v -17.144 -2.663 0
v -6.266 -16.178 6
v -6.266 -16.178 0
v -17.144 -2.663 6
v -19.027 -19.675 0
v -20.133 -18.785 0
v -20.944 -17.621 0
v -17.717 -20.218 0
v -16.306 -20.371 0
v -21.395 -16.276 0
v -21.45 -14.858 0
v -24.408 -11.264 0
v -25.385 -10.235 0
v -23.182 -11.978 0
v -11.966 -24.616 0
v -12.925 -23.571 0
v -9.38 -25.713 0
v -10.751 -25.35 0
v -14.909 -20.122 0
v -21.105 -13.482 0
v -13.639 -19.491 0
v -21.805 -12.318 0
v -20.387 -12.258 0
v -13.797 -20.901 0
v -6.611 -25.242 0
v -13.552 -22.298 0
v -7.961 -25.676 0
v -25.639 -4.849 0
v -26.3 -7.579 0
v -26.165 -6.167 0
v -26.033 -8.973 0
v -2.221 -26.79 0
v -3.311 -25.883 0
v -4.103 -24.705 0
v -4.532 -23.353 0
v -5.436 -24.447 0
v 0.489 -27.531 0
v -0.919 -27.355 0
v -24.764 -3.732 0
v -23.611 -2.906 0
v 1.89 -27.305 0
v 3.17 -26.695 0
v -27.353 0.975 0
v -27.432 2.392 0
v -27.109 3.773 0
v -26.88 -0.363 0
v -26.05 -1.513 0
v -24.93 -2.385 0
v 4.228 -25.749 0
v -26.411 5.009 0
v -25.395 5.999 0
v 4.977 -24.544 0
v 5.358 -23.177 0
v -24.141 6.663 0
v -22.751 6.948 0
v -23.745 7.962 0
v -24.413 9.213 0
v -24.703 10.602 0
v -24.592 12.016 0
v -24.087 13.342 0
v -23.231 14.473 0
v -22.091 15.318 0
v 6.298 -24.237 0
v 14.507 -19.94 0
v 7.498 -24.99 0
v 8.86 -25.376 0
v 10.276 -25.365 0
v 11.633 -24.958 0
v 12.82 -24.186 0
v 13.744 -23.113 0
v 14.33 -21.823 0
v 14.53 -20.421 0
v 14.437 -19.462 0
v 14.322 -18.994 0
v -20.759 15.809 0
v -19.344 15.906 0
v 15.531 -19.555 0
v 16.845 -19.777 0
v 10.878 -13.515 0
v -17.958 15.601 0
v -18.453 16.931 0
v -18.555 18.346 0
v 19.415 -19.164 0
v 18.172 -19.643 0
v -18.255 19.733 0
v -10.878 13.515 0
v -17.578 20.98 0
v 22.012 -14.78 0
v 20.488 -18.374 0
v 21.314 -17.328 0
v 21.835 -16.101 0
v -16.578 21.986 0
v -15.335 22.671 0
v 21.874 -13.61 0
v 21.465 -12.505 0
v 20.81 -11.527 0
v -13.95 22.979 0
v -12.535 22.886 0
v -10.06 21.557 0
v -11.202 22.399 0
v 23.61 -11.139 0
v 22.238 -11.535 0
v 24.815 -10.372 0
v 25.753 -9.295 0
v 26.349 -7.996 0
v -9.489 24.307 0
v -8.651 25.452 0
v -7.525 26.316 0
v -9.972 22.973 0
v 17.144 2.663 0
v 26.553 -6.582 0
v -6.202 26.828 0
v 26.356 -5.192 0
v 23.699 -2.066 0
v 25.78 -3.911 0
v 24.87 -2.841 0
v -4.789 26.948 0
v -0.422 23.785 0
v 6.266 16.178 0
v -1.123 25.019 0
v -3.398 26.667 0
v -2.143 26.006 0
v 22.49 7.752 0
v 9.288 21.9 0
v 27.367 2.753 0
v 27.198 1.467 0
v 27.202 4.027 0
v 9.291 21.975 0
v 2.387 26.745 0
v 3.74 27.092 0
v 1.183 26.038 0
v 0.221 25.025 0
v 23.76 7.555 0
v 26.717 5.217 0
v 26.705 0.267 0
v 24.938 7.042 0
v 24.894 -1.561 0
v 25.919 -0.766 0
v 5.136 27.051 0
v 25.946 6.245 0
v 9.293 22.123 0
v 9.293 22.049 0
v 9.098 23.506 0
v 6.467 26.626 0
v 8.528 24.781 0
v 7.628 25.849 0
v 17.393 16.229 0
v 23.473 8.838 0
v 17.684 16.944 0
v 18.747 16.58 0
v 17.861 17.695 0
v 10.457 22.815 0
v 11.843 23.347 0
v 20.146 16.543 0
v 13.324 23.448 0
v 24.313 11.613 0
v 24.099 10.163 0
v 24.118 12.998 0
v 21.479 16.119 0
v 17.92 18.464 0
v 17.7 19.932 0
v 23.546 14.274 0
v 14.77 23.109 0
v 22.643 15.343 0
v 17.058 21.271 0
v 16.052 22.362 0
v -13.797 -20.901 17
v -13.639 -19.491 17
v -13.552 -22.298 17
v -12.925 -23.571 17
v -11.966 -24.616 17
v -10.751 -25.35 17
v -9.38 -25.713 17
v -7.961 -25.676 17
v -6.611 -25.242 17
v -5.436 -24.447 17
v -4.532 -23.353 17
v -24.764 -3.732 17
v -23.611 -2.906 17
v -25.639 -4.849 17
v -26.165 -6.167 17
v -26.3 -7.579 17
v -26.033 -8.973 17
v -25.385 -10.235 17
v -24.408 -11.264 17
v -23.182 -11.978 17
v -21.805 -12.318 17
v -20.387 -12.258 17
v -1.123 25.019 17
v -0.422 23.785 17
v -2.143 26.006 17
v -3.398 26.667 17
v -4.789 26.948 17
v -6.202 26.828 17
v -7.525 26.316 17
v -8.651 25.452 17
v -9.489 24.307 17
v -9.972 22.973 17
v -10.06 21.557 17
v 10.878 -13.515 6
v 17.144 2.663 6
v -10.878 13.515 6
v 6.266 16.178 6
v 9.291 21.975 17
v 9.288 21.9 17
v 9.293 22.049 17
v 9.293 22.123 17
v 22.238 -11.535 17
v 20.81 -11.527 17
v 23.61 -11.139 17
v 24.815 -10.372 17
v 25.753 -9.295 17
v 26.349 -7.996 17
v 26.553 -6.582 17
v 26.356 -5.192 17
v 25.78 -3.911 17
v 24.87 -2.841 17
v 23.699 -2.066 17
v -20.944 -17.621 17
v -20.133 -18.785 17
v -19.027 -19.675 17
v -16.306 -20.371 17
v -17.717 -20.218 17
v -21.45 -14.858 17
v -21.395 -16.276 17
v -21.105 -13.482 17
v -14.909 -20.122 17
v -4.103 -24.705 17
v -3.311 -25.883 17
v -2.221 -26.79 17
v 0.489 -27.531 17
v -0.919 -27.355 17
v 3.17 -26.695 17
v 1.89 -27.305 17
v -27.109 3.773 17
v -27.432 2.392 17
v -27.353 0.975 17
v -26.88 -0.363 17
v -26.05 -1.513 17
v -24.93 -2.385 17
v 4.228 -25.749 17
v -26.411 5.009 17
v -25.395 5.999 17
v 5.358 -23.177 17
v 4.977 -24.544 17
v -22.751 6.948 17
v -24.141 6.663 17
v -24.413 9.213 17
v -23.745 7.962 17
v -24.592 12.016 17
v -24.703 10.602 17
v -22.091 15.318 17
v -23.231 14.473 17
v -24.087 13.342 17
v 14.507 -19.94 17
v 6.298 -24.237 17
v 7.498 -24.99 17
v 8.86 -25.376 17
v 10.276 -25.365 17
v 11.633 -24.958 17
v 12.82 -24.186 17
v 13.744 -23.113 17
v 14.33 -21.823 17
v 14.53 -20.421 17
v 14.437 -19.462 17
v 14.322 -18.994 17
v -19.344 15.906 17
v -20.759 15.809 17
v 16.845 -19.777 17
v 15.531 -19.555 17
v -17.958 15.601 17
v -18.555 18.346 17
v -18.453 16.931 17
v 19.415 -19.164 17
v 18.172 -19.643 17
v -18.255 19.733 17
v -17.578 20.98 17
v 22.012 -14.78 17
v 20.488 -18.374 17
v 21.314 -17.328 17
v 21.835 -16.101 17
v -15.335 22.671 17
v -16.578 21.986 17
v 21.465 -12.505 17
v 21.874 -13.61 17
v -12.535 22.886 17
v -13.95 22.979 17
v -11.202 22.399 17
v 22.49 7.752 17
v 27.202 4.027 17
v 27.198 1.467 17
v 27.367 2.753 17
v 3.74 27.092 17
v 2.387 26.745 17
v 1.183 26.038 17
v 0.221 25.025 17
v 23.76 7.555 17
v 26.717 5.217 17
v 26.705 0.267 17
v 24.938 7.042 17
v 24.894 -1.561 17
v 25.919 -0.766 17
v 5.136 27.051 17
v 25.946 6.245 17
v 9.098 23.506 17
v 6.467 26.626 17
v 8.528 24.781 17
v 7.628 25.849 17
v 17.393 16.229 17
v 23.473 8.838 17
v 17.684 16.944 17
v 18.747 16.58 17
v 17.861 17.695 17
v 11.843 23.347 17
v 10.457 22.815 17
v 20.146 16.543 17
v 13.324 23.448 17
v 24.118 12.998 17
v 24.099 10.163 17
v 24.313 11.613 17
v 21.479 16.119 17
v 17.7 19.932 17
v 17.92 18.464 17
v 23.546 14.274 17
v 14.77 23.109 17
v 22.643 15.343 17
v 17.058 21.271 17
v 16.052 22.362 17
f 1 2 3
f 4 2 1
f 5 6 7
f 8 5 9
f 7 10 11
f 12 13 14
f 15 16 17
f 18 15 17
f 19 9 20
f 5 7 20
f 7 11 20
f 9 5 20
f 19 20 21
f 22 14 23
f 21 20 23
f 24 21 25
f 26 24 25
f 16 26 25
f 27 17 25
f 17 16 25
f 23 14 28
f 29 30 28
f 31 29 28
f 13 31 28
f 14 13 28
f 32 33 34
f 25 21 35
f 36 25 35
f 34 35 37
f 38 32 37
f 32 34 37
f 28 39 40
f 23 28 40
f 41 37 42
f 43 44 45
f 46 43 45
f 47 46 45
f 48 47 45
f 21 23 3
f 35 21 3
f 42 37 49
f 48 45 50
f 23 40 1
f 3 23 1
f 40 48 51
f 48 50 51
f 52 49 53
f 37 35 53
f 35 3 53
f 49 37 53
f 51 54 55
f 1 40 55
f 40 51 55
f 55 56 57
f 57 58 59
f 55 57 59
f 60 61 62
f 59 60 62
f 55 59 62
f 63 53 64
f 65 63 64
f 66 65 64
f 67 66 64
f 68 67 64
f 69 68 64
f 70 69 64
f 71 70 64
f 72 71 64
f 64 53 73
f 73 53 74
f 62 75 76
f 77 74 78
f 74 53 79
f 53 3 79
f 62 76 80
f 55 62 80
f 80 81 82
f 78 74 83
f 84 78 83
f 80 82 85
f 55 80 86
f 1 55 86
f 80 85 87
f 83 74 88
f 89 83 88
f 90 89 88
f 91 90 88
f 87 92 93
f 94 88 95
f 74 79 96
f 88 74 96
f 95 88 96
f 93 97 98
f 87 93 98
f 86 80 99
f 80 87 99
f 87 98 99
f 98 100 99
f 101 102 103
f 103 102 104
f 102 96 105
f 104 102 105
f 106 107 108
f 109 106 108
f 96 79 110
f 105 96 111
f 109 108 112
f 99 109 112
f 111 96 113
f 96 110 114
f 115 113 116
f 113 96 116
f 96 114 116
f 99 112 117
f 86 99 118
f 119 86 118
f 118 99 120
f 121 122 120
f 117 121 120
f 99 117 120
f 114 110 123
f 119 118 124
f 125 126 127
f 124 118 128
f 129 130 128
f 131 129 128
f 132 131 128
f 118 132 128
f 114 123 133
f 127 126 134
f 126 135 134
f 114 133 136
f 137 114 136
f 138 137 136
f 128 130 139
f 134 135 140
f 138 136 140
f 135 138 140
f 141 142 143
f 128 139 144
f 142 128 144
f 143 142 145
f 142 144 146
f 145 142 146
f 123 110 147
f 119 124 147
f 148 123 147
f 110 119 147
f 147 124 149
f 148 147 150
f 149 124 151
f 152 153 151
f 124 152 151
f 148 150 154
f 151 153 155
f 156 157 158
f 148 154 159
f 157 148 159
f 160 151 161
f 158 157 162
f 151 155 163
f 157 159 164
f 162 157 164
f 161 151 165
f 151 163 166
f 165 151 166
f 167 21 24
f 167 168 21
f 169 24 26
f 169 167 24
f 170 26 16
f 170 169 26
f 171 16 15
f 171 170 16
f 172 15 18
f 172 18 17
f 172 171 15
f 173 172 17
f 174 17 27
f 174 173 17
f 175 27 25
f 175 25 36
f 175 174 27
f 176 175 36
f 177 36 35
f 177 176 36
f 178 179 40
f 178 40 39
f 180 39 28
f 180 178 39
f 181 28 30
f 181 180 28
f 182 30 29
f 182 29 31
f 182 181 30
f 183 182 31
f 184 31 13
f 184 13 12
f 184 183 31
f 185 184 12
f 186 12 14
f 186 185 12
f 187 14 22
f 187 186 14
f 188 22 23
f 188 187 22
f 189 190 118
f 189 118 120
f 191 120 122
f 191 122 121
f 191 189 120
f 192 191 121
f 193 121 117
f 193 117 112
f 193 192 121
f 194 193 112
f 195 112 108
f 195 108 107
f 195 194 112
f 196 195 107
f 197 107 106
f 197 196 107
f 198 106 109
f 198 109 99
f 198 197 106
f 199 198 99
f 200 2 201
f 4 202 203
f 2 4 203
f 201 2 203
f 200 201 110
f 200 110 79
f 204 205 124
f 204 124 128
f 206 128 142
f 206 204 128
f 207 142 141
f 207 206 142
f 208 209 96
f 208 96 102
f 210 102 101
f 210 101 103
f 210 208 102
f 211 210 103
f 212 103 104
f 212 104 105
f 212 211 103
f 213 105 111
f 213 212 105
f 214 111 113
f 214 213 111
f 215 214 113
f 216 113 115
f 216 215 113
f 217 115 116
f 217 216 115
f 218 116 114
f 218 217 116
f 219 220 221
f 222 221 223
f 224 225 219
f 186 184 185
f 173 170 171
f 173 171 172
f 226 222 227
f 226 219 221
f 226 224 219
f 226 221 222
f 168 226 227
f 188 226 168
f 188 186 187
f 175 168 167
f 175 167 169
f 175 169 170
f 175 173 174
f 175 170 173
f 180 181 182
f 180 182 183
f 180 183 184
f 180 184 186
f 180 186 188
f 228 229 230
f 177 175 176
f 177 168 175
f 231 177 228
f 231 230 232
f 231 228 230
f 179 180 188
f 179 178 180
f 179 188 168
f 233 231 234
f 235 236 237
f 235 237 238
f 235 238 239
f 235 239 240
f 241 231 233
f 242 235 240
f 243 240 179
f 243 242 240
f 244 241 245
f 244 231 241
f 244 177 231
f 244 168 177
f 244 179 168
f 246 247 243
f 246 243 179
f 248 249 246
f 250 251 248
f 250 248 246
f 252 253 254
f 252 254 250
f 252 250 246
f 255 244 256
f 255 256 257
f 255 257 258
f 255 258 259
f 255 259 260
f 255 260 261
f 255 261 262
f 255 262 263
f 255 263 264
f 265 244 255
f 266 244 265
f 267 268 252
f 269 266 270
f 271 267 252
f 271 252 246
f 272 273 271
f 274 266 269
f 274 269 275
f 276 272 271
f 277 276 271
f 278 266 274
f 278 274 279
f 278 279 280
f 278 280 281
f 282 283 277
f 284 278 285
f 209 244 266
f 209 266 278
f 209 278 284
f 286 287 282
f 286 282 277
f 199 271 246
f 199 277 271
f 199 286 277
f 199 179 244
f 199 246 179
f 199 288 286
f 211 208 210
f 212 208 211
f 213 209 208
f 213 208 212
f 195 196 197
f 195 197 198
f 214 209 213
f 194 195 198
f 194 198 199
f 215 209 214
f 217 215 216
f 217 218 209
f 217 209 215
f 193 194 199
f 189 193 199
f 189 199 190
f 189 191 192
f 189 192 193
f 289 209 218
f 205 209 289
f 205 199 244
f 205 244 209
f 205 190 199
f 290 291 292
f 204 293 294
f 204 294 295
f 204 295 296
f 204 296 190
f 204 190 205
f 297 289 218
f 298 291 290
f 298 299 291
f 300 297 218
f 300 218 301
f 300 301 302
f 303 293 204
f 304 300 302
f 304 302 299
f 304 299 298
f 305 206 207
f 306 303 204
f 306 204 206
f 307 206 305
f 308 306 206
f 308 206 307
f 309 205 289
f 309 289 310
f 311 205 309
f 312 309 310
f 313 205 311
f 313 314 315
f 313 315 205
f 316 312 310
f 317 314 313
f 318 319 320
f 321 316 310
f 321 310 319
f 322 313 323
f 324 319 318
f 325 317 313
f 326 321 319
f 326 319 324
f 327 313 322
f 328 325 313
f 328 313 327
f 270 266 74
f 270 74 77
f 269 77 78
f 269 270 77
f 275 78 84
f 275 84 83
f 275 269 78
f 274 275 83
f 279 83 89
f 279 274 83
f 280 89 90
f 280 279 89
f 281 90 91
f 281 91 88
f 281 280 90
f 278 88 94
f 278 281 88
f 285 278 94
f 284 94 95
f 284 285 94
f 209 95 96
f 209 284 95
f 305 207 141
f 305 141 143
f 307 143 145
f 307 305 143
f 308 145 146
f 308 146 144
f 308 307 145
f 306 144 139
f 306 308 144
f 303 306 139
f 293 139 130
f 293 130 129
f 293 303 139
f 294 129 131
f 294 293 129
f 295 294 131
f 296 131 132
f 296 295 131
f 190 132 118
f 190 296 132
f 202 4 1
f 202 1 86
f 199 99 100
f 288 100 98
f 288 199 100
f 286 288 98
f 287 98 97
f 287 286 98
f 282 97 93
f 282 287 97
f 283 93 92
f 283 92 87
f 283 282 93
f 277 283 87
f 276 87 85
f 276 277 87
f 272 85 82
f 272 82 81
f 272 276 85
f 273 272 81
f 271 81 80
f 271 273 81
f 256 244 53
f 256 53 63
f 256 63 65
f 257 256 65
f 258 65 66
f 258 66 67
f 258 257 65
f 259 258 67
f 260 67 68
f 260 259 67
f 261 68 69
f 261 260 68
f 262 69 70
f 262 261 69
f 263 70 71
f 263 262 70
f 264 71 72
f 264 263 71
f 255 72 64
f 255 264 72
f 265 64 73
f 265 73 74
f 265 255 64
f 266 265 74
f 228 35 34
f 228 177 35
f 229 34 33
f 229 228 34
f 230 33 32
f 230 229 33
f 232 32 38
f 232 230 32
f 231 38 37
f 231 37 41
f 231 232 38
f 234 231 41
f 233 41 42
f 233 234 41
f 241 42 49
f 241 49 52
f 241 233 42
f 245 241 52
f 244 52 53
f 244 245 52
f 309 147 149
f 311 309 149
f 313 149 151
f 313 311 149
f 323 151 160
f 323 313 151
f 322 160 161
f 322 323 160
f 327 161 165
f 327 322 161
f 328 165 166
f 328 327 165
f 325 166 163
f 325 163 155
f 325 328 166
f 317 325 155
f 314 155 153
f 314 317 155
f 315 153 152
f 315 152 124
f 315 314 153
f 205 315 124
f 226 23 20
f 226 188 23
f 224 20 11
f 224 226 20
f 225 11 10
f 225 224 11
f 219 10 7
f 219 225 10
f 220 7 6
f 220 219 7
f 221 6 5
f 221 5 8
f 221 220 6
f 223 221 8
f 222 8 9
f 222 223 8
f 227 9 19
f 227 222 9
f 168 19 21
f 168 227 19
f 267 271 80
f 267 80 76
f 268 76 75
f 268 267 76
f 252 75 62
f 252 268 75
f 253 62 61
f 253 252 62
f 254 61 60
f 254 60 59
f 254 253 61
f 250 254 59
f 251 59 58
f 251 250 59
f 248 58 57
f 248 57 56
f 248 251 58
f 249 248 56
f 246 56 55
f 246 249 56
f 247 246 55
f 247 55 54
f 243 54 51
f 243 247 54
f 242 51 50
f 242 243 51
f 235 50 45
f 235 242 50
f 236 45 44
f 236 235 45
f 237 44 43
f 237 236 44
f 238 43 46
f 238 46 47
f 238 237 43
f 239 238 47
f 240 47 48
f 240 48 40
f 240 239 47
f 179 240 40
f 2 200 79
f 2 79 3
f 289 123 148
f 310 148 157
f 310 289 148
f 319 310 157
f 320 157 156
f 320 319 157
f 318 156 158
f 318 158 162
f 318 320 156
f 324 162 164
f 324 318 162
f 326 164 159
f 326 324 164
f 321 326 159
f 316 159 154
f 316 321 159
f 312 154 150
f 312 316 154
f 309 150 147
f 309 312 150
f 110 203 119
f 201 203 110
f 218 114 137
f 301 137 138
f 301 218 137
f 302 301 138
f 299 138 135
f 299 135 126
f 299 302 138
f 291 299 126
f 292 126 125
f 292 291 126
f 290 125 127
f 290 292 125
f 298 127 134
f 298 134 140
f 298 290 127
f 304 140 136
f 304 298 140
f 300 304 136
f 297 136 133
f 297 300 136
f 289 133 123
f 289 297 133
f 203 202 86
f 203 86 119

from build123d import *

# Parameters (mm, degrees)
F1_DEPTH = 12
F2_DEPTH = 6
F4_DEPTH = 6
F5_R     = 22.5356386782
F6_DEPTH = 5
F8_DEPTH = 5
F9_DEPTH = 12


with BuildPart() as f1:
    # F0 (on Top) → F1 (new body)
    with BuildSketch(Plane.XY):
        Polygon((-6.8684225896, -21.4634522332), (15.1536835921, -16.6799545631), (22.0221061816, 4.7834976701), (6.8684225896, 21.4634522332), (-15.1536835921, 16.6799545631), (-22.0221061816, -4.7834976701), align=None)
        Polygon((17.1437614944, 2.6631325835), (10.8782212182, -13.5153666788), (-6.2655402762, -16.1784992623), (-17.1437614944, -2.6631325835), (-10.8782212182, 13.5153666788), (6.2655402762, 16.1784992623), align=None, mode=Mode.SUBTRACT)
    extrude(amount=F1_DEPTH)

    # F2 (add): a face of the model
    f2_faces = [f1.faces().sort_by_distance(p)[0] for p in [
        (4.0120820931, -18.4706890138, 12),
    ]]
    extrude(f2_faces, amount=-F2_DEPTH)

    # F3 (on face) → F4 (join)
    with BuildSketch(Plane.XY.offset(12)):
        Polygon((-6.8684225896, -21.4634522332), (15.1536835921, -16.6799545631), (22.0221061816, 4.7834976701), (6.8684225896, 21.4634522332), (-15.1536835921, 16.6799545631), (-22.0221061816, -4.7834976701), align=None)
    extrude(amount=-F4_DEPTH)

    # F5 (on face) → F6 (join)
    with BuildSketch(Plane.XY.offset(12)):
        Circle(F5_R)
    extrude(amount=F6_DEPTH)

    # F7 (on face) → F8 (join, through all)
    with BuildSketch(Plane.XY.offset(17)):
        with BuildLine():
            ThreePointArc((-15.3228461638, 13.3118642514), (-10.7195158187, 13.8841980042), (-8.5676941997, 17.9936845793))
            ThreePointArc((-8.5676941997, 17.9936845793), (-8.571695634, 18.193680409), (-8.5836935324, 18.3933561306))
            ThreePointArc((-8.5836935324, 18.3933561306), (-9.6069182239, 19.842074122), (-10.0600152117, 21.5568556553))
            ThreePointArc((-10.0600152117, 21.5568556553), (-16.5779692563, 21.9859576265), (-17.958244305, 15.6013907485))
            ThreePointArc((-17.958244305, 15.6013907485), (-16.4342353434, 14.6941039842), (-15.3228461638, 13.3118642514))
        make_face()
        with BuildLine():
            ThreePointArc((-10.0600152117, 21.5568556553), (-9.6069182239, 19.842074122), (-8.5836935324, 18.3933561306))
            ThreePointArc((-8.5836935324, 18.3933561306), (-9.0367905202, 20.108137664), (-10.0600152117, 21.5568556553))
        make_face()
        with BuildLine():
            ThreePointArc((-10.0600152117, 21.5568556553), (-9.0367905202, 20.108137664), (-8.5836935324, 18.3933561306))
            ThreePointArc((-8.5836935324, 18.3933561306), (-3.9497951777, 17.0850151275), (-0.3603423089, 20.2944696365))
            ThreePointArc((-0.3603423089, 20.2944696365), (-0.7058578854, 22.034122353), (-0.4223180959, 23.7849443815))
            ThreePointArc((-0.4223180959, 23.7849443815), (-6.2022339112, 26.8280392859), (-10.0600152117, 21.5568556553))
        make_face()
        with BuildLine():
            ThreePointArc((-14.7133962691, 10.9195704206), (-14.86815373, 12.1539223707), (-15.3228461638, 13.3118642514))
            ThreePointArc((-15.3228461638, 13.3118642514), (-16.8468551254, 14.2191510156), (-17.958244305, 15.6013907485))
            ThreePointArc((-17.958244305, 15.6013907485), (-24.0872231108, 13.3423041573), (-22.7513298124, 6.9483036471))
            ThreePointArc((-22.7513298124, 6.9483036471), (-20.9900515753, 6.7393262339), (-19.4125394898, 5.9286301086))
            ThreePointArc((-19.4125394898, 5.9286301086), (-16.0730471171, 7.4920555699), (-14.7133962691, 10.9195704206))
        make_face()
        with BuildLine():
            ThreePointArc((-17.958244305, 15.6013907485), (-16.8468551254, 14.2191510156), (-15.3228461638, 13.3118642514))
            ThreePointArc((-15.3228461638, 13.3118642514), (-16.4342353434, 14.6941039842), (-17.958244305, 15.6013907485))
        make_face()
        with BuildLine():
            ThreePointArc((-0.0760145444, 21.9565272067), (-0.1476090631, 21.1134261386), (-0.3603423089, 20.2944696365))
            ThreePointArc((-0.3603423089, 20.2944696365), (3.3407842567, 17.2144643949), (7.9253153735, 18.6864849728))
            ThreePointArc((7.9253153735, 18.6864849728), (8.3172516941, 20.4162706555), (9.2884016553, 21.9004001446))
            ThreePointArc((9.2884016553, 21.9004001446), (9.2921158652, 22.0116159212), (9.2933541397, 22.1228868113))
            ThreePointArc((9.2933541397, 22.1228868113), (5.1364552078, 27.0512922927), (-0.4223180959, 23.7849443815))
            ThreePointArc((-0.4223180959, 23.7849443815), (-0.163353237, 22.8869888549), (-0.0760145444, 21.9565272067))
        make_face()
        with BuildLine():
            ThreePointArc((-0.4223180959, 23.7849443815), (-0.7058578854, 22.034122353), (-0.3603423089, 20.2944696365))
            ThreePointArc((-0.3603423089, 20.2944696365), (-0.1476090631, 21.1134261386), (-0.0760145444, 21.9565272067))
            ThreePointArc((-0.0760145444, 21.9565272067), (-0.163353237, 22.8869888549), (-0.4223180959, 23.7849443815))
        make_face()
        with BuildLine():
            ThreePointArc((9.2884016553, 21.9004001446), (8.8964653347, 20.1706144619), (7.9253153735, 18.6864849728))
            ThreePointArc((7.9253153735, 18.6864849728), (10.053711743, 14.3673763799), (14.8406140286, 13.8474372958))
            ThreePointArc((14.8406140286, 13.8474372958), (15.9022328957, 15.2682602857), (17.3930723778, 16.2290777639))
            ThreePointArc((17.3930723778, 16.2290777639), (17.7867551587, 17.3158579496), (17.9203628891, 18.4639983061))
            ThreePointArc((17.9203628891, 18.4639983061), (14.7697132927, 23.1094157346), (9.2884016553, 21.9004001446))
        make_face()
        with BuildLine():
            ThreePointArc((9.2884016553, 21.9004001446), (8.3172516941, 20.4162706555), (7.9253153735, 18.6864849728))
            ThreePointArc((7.9253153735, 18.6864849728), (8.8964653347, 20.1706144619), (9.2884016553, 21.9004001446))
        make_face()
        with BuildLine():
            ThreePointArc((-19.4125394898, 5.9286301086), (-20.9900515753, 6.7393262339), (-22.7513298124, 6.9483036471))
            ThreePointArc((-22.7513298124, 6.9483036471), (-21.1738177269, 6.1376075218), (-19.4125394898, 5.9286301086))
        make_face()
        with BuildLine():
            ThreePointArc((-19.4125394898, 5.9286301086), (-21.1738177269, 6.1376075218), (-22.7513298124, 6.9483036471))
            ThreePointArc((-22.7513298124, 6.9483036471), (-27.4315772639, 2.3916450882), (-23.6105037059, -2.9062082783))
            ThreePointArc((-23.6105037059, -2.9062082783), (-21.9164972013, -2.3807422472), (-20.1456283806, -2.4797180399))
            ThreePointArc((-20.1456283806, -2.4797180399), (-18.1770538363, -0.6383809453), (-17.4504730331, 1.957363335))
            ThreePointArc((-17.4504730331, 1.957363335), (-17.9677468694, 4.1721243022), (-19.4125394898, 5.9286301086))
        make_face()
        with BuildLine():
            ThreePointArc((17.3930723778, 16.2290777639), (16.3314535106, 14.8082547741), (14.8406140286, 13.8474372958))
            ThreePointArc((14.8406140286, 13.8474372958), (15.0282611338, 9.0360384653), (19.1898356953, 6.6140419105))
            ThreePointArc((19.1898356953, 6.6140419105), (20.7375735625, 7.4802290047), (22.4903228751, 7.7516004012))
            ThreePointArc((22.4903228751, 7.7516004012), (23.8346616371, 9.4776861736), (24.3133235172, 11.6125167536))
            ThreePointArc((24.3133235172, 11.6125167536), (22.0880977695, 15.7719190963), (17.3930723778, 16.2290777639))
        make_face()
        with BuildLine():
            ThreePointArc((17.3930723778, 16.2290777639), (15.9022328957, 15.2682602857), (14.8406140286, 13.8474372958))
            ThreePointArc((14.8406140286, 13.8474372958), (16.3314535106, 14.8082547741), (17.3930723778, 16.2290777639))
        make_face()
        with BuildLine():
            ThreePointArc((-20.1456283806, -2.4797180399), (-21.9164972013, -2.3807422472), (-23.6105037059, -2.9062082783))
            ThreePointArc((-23.6105037059, -2.9062082783), (-21.8396348852, -3.005184071), (-20.1456283806, -2.4797180399))
        make_face()
        with BuildLine():
            ThreePointArc((-20.1456283806, -2.4797180399), (-21.8396348852, -3.005184071), (-23.6105037059, -2.9062082783))
            ThreePointArc((-23.6105037059, -2.9062082783), (-26.0327625001, -8.972551144), (-20.387207014, -12.2582103903))
            ThreePointArc((-20.387207014, -12.2582103903), (-19.053381356, -11.0891587654), (-17.3953551071, -10.4593004118))
            ThreePointArc((-17.3953551071, -10.4593004118), (-16.585938737, -8.9938168824), (-16.3056590535, -7.3432896533))
            ThreePointArc((-16.3056590535, -7.3432896533), (-17.3813659092, -4.2449153509), (-20.1456283806, -2.4797180399))
        make_face()
        with BuildLine():
            ThreePointArc((22.4903228751, 7.7516004012), (20.9425850079, 6.885413307), (19.1898356953, 6.6140419105))
            ThreePointArc((19.1898356953, 6.6140419105), (17.4042876471, 2.1422874102), (20.2209604362, -1.7629814079))
            ThreePointArc((20.2209604362, -1.7629814079), (21.9871993653, -1.601201827), (23.6987922291, -2.0661990919))
            ThreePointArc((23.6987922291, -2.0661990919), (26.3455148518, -0.275092905), (27.3668350532, 2.753125558))
            ThreePointArc((27.3668350532, 2.753125558), (25.9457622045, 6.2447269736), (22.4903228751, 7.7516004012))
        make_face()
        with BuildLine():
            ThreePointArc((22.4903228751, 7.7516004012), (20.7375735625, 7.4802290047), (19.1898356953, 6.6140419105))
            ThreePointArc((19.1898356953, 6.6140419105), (20.9425850079, 6.885413307), (22.4903228751, 7.7516004012))
        make_face()
        with BuildLine():
            ThreePointArc((-17.3953551071, -10.4593004118), (-19.053381356, -11.0891587654), (-20.387207014, -12.2582103903))
            ThreePointArc((-20.387207014, -12.2582103903), (-18.7291807651, -11.6283520367), (-17.3953551071, -10.4593004118))
        make_face()
        with BuildLine():
            ThreePointArc((-17.3953551071, -10.4593004118), (-18.7291807651, -11.6283520367), (-20.387207014, -12.2582103903))
            ThreePointArc((-20.387207014, -12.2582103903), (-20.1326465997, -18.7853117703), (-13.6387770174, -19.4906565634))
            ThreePointArc((-13.6387770174, -19.4906565634), (-12.8957627797, -17.8801589912), (-11.6372669038, -16.6303747227))
            ThreePointArc((-11.6372669038, -16.6303747227), (-11.517156057, -16.0073953668), (-11.4769030677, -15.3742211488))
            ThreePointArc((-11.4769030677, -15.3742211488), (-13.282553384, -11.5276473358), (-17.3953551071, -10.4593004118))
        make_face()
        with BuildLine():
            ThreePointArc((23.6987922291, -2.0661990919), (21.9325532999, -2.2279786728), (20.2209604362, -1.7629814079))
            ThreePointArc((20.2209604362, -1.7629814079), (16.7709547133, -5.1218846001), (17.755697416, -9.8351692247))
            ThreePointArc((17.755697416, -9.8351692247), (19.4350386505, -10.4057703163), (20.8095251099, -11.5267339912))
            ThreePointArc((20.8095251099, -11.5267339912), (24.8150516904, -10.3715647262), (26.5529176121, -6.5823060579))
            ThreePointArc((26.5529176121, -6.5823060579), (25.7795813724, -3.9111053059), (23.6987922291, -2.0661990919))
        make_face()
        with BuildLine():
            ThreePointArc((23.6987922291, -2.0661990919), (21.9871993653, -1.601201827), (20.2209604362, -1.7629814079))
            ThreePointArc((20.2209604362, -1.7629814079), (21.9325532999, -2.2279786728), (23.6987922291, -2.0661990919))
        make_face()
        with BuildLine():
            ThreePointArc((-11.6372669038, -16.6303747227), (-12.8957627797, -17.8801589912), (-13.6387770174, -19.4906565634))
            ThreePointArc((-13.6387770174, -19.4906565634), (-12.3802811414, -18.2408722949), (-11.6372669038, -16.6303747227))
        make_face()
        with BuildLine():
            ThreePointArc((-11.6372669038, -16.6303747227), (-12.3802811414, -18.2408722949), (-13.6387770174, -19.4906565634))
            ThreePointArc((-13.6387770174, -19.4906565634), (-10.7514132029, -25.3499213323), (-4.5320785701, -23.3529911497))
            ThreePointArc((-4.5320785701, -23.3529911497), (-4.5083496645, -21.5795172913), (-3.8669895315, -19.9259061618))
            ThreePointArc((-3.8669895315, -19.9259061618), (-6.8468685041, -16.1436989423), (-11.6372669038, -16.6303747227))
        make_face()
        with BuildLine():
            ThreePointArc((20.8095251099, -11.5267339912), (19.1301838754, -10.9561328996), (17.755697416, -9.8351692247))
            ThreePointArc((17.755697416, -9.8351692247), (13.2377713502, -11.5004362323), (12.2203130071, -16.2067669328))
            ThreePointArc((12.2203130071, -16.2067669328), (13.5223831912, -17.4110865845), (14.3221020507, -18.9941918663))
            ThreePointArc((14.3221020507, -18.9941918663), (19.4153223591, -19.1642872449), (22.0123049138, -14.779597158))
            ThreePointArc((22.0123049138, -14.779597158), (21.7019797949, -13.0455413603), (20.8095251099, -11.5267339912))
        make_face()
        with BuildLine():
            ThreePointArc((20.8095251099, -11.5267339912), (19.4350386505, -10.4057703163), (17.755697416, -9.8351692247))
            ThreePointArc((17.755697416, -9.8351692247), (19.1301838754, -10.9561328996), (20.8095251099, -11.5267339912))
        make_face()
        with BuildLine():
            ThreePointArc((-3.8669895315, -19.9259061618), (-4.5083496645, -21.5795172913), (-4.5320785701, -23.3529911497))
            ThreePointArc((-4.5320785701, -23.3529911497), (-3.985861752, -22.1004512609), (-3.7991408535, -20.7468101373))
            ThreePointArc((-3.7991408535, -20.7468101373), (-3.8161318925, -20.3349585924), (-3.8669895315, -19.9259061618))
        make_face()
        with BuildLine():
            ThreePointArc((-3.7991408535, -20.7468101373), (-3.985861752, -22.1004512609), (-4.5320785701, -23.3529911497))
            ThreePointArc((-4.5320785701, -23.3529911497), (0.4888372102, -27.5312991992), (5.3582574346, -23.1773814109))
            ThreePointArc((5.3582574346, -23.1773814109), (4.6585980648, -21.5475810079), (4.5719254612, -19.7760674044))
            ThreePointArc((4.5719254612, -19.7760674044), (0.3113082936, -17.5328751492), (-3.8669895315, -19.9259061618))
            ThreePointArc((-3.8669895315, -19.9259061618), (-3.8161318925, -20.3349585924), (-3.7991408535, -20.7468101373))
        make_face()
        with BuildLine():
            ThreePointArc((14.3221020507, -18.9941918663), (13.0200318666, -17.7898722147), (12.2203130071, -16.2067669328))
            ThreePointArc((12.2203130071, -16.2067669328), (7.4156570592, -15.8904579617), (4.5719254612, -19.7760674044))
            ThreePointArc((4.5719254612, -19.7760674044), (5.1885622604, -21.0932097553), (5.4000727519, -22.5320871742))
            ThreePointArc((5.4000727519, -22.5320871742), (5.3896079714, -22.8554109952), (5.3582574346, -23.1773814109))
            ThreePointArc((5.3582574346, -23.1773814109), (10.9689875629, -25.2098511497), (14.530110144, -20.4213616411))
            ThreePointArc((14.530110144, -20.4213616411), (14.47783485, -19.7002373569), (14.3221020507, -18.9941918663))
        make_face()
        with BuildLine():
            ThreePointArc((14.3221020507, -18.9941918663), (13.5223831912, -17.4110865845), (12.2203130071, -16.2067669328))
            ThreePointArc((12.2203130071, -16.2067669328), (13.0200318666, -17.7898722147), (14.3221020507, -18.9941918663))
        make_face()
        with BuildLine():
            ThreePointArc((4.5719254612, -19.7760674044), (4.6585980648, -21.5475810079), (5.3582574346, -23.1773814109))
            ThreePointArc((5.3582574346, -23.1773814109), (5.3896079714, -22.8554109952), (5.4000727519, -22.5320871742))
            ThreePointArc((5.4000727519, -22.5320871742), (5.1885622604, -21.0932097553), (4.5719254612, -19.7760674044))
        make_face()
    extrude(amount=-F8_DEPTH)

    # F9 (add, through all): a face of the model
    f9_faces = [f1.faces().sort_by_distance(p)[0] for p in [
        (19.3251526539, -6.1841549809, 12),
    ]]
    extrude(f9_faces, amount=F9_DEPTH)


solid = f1.part
